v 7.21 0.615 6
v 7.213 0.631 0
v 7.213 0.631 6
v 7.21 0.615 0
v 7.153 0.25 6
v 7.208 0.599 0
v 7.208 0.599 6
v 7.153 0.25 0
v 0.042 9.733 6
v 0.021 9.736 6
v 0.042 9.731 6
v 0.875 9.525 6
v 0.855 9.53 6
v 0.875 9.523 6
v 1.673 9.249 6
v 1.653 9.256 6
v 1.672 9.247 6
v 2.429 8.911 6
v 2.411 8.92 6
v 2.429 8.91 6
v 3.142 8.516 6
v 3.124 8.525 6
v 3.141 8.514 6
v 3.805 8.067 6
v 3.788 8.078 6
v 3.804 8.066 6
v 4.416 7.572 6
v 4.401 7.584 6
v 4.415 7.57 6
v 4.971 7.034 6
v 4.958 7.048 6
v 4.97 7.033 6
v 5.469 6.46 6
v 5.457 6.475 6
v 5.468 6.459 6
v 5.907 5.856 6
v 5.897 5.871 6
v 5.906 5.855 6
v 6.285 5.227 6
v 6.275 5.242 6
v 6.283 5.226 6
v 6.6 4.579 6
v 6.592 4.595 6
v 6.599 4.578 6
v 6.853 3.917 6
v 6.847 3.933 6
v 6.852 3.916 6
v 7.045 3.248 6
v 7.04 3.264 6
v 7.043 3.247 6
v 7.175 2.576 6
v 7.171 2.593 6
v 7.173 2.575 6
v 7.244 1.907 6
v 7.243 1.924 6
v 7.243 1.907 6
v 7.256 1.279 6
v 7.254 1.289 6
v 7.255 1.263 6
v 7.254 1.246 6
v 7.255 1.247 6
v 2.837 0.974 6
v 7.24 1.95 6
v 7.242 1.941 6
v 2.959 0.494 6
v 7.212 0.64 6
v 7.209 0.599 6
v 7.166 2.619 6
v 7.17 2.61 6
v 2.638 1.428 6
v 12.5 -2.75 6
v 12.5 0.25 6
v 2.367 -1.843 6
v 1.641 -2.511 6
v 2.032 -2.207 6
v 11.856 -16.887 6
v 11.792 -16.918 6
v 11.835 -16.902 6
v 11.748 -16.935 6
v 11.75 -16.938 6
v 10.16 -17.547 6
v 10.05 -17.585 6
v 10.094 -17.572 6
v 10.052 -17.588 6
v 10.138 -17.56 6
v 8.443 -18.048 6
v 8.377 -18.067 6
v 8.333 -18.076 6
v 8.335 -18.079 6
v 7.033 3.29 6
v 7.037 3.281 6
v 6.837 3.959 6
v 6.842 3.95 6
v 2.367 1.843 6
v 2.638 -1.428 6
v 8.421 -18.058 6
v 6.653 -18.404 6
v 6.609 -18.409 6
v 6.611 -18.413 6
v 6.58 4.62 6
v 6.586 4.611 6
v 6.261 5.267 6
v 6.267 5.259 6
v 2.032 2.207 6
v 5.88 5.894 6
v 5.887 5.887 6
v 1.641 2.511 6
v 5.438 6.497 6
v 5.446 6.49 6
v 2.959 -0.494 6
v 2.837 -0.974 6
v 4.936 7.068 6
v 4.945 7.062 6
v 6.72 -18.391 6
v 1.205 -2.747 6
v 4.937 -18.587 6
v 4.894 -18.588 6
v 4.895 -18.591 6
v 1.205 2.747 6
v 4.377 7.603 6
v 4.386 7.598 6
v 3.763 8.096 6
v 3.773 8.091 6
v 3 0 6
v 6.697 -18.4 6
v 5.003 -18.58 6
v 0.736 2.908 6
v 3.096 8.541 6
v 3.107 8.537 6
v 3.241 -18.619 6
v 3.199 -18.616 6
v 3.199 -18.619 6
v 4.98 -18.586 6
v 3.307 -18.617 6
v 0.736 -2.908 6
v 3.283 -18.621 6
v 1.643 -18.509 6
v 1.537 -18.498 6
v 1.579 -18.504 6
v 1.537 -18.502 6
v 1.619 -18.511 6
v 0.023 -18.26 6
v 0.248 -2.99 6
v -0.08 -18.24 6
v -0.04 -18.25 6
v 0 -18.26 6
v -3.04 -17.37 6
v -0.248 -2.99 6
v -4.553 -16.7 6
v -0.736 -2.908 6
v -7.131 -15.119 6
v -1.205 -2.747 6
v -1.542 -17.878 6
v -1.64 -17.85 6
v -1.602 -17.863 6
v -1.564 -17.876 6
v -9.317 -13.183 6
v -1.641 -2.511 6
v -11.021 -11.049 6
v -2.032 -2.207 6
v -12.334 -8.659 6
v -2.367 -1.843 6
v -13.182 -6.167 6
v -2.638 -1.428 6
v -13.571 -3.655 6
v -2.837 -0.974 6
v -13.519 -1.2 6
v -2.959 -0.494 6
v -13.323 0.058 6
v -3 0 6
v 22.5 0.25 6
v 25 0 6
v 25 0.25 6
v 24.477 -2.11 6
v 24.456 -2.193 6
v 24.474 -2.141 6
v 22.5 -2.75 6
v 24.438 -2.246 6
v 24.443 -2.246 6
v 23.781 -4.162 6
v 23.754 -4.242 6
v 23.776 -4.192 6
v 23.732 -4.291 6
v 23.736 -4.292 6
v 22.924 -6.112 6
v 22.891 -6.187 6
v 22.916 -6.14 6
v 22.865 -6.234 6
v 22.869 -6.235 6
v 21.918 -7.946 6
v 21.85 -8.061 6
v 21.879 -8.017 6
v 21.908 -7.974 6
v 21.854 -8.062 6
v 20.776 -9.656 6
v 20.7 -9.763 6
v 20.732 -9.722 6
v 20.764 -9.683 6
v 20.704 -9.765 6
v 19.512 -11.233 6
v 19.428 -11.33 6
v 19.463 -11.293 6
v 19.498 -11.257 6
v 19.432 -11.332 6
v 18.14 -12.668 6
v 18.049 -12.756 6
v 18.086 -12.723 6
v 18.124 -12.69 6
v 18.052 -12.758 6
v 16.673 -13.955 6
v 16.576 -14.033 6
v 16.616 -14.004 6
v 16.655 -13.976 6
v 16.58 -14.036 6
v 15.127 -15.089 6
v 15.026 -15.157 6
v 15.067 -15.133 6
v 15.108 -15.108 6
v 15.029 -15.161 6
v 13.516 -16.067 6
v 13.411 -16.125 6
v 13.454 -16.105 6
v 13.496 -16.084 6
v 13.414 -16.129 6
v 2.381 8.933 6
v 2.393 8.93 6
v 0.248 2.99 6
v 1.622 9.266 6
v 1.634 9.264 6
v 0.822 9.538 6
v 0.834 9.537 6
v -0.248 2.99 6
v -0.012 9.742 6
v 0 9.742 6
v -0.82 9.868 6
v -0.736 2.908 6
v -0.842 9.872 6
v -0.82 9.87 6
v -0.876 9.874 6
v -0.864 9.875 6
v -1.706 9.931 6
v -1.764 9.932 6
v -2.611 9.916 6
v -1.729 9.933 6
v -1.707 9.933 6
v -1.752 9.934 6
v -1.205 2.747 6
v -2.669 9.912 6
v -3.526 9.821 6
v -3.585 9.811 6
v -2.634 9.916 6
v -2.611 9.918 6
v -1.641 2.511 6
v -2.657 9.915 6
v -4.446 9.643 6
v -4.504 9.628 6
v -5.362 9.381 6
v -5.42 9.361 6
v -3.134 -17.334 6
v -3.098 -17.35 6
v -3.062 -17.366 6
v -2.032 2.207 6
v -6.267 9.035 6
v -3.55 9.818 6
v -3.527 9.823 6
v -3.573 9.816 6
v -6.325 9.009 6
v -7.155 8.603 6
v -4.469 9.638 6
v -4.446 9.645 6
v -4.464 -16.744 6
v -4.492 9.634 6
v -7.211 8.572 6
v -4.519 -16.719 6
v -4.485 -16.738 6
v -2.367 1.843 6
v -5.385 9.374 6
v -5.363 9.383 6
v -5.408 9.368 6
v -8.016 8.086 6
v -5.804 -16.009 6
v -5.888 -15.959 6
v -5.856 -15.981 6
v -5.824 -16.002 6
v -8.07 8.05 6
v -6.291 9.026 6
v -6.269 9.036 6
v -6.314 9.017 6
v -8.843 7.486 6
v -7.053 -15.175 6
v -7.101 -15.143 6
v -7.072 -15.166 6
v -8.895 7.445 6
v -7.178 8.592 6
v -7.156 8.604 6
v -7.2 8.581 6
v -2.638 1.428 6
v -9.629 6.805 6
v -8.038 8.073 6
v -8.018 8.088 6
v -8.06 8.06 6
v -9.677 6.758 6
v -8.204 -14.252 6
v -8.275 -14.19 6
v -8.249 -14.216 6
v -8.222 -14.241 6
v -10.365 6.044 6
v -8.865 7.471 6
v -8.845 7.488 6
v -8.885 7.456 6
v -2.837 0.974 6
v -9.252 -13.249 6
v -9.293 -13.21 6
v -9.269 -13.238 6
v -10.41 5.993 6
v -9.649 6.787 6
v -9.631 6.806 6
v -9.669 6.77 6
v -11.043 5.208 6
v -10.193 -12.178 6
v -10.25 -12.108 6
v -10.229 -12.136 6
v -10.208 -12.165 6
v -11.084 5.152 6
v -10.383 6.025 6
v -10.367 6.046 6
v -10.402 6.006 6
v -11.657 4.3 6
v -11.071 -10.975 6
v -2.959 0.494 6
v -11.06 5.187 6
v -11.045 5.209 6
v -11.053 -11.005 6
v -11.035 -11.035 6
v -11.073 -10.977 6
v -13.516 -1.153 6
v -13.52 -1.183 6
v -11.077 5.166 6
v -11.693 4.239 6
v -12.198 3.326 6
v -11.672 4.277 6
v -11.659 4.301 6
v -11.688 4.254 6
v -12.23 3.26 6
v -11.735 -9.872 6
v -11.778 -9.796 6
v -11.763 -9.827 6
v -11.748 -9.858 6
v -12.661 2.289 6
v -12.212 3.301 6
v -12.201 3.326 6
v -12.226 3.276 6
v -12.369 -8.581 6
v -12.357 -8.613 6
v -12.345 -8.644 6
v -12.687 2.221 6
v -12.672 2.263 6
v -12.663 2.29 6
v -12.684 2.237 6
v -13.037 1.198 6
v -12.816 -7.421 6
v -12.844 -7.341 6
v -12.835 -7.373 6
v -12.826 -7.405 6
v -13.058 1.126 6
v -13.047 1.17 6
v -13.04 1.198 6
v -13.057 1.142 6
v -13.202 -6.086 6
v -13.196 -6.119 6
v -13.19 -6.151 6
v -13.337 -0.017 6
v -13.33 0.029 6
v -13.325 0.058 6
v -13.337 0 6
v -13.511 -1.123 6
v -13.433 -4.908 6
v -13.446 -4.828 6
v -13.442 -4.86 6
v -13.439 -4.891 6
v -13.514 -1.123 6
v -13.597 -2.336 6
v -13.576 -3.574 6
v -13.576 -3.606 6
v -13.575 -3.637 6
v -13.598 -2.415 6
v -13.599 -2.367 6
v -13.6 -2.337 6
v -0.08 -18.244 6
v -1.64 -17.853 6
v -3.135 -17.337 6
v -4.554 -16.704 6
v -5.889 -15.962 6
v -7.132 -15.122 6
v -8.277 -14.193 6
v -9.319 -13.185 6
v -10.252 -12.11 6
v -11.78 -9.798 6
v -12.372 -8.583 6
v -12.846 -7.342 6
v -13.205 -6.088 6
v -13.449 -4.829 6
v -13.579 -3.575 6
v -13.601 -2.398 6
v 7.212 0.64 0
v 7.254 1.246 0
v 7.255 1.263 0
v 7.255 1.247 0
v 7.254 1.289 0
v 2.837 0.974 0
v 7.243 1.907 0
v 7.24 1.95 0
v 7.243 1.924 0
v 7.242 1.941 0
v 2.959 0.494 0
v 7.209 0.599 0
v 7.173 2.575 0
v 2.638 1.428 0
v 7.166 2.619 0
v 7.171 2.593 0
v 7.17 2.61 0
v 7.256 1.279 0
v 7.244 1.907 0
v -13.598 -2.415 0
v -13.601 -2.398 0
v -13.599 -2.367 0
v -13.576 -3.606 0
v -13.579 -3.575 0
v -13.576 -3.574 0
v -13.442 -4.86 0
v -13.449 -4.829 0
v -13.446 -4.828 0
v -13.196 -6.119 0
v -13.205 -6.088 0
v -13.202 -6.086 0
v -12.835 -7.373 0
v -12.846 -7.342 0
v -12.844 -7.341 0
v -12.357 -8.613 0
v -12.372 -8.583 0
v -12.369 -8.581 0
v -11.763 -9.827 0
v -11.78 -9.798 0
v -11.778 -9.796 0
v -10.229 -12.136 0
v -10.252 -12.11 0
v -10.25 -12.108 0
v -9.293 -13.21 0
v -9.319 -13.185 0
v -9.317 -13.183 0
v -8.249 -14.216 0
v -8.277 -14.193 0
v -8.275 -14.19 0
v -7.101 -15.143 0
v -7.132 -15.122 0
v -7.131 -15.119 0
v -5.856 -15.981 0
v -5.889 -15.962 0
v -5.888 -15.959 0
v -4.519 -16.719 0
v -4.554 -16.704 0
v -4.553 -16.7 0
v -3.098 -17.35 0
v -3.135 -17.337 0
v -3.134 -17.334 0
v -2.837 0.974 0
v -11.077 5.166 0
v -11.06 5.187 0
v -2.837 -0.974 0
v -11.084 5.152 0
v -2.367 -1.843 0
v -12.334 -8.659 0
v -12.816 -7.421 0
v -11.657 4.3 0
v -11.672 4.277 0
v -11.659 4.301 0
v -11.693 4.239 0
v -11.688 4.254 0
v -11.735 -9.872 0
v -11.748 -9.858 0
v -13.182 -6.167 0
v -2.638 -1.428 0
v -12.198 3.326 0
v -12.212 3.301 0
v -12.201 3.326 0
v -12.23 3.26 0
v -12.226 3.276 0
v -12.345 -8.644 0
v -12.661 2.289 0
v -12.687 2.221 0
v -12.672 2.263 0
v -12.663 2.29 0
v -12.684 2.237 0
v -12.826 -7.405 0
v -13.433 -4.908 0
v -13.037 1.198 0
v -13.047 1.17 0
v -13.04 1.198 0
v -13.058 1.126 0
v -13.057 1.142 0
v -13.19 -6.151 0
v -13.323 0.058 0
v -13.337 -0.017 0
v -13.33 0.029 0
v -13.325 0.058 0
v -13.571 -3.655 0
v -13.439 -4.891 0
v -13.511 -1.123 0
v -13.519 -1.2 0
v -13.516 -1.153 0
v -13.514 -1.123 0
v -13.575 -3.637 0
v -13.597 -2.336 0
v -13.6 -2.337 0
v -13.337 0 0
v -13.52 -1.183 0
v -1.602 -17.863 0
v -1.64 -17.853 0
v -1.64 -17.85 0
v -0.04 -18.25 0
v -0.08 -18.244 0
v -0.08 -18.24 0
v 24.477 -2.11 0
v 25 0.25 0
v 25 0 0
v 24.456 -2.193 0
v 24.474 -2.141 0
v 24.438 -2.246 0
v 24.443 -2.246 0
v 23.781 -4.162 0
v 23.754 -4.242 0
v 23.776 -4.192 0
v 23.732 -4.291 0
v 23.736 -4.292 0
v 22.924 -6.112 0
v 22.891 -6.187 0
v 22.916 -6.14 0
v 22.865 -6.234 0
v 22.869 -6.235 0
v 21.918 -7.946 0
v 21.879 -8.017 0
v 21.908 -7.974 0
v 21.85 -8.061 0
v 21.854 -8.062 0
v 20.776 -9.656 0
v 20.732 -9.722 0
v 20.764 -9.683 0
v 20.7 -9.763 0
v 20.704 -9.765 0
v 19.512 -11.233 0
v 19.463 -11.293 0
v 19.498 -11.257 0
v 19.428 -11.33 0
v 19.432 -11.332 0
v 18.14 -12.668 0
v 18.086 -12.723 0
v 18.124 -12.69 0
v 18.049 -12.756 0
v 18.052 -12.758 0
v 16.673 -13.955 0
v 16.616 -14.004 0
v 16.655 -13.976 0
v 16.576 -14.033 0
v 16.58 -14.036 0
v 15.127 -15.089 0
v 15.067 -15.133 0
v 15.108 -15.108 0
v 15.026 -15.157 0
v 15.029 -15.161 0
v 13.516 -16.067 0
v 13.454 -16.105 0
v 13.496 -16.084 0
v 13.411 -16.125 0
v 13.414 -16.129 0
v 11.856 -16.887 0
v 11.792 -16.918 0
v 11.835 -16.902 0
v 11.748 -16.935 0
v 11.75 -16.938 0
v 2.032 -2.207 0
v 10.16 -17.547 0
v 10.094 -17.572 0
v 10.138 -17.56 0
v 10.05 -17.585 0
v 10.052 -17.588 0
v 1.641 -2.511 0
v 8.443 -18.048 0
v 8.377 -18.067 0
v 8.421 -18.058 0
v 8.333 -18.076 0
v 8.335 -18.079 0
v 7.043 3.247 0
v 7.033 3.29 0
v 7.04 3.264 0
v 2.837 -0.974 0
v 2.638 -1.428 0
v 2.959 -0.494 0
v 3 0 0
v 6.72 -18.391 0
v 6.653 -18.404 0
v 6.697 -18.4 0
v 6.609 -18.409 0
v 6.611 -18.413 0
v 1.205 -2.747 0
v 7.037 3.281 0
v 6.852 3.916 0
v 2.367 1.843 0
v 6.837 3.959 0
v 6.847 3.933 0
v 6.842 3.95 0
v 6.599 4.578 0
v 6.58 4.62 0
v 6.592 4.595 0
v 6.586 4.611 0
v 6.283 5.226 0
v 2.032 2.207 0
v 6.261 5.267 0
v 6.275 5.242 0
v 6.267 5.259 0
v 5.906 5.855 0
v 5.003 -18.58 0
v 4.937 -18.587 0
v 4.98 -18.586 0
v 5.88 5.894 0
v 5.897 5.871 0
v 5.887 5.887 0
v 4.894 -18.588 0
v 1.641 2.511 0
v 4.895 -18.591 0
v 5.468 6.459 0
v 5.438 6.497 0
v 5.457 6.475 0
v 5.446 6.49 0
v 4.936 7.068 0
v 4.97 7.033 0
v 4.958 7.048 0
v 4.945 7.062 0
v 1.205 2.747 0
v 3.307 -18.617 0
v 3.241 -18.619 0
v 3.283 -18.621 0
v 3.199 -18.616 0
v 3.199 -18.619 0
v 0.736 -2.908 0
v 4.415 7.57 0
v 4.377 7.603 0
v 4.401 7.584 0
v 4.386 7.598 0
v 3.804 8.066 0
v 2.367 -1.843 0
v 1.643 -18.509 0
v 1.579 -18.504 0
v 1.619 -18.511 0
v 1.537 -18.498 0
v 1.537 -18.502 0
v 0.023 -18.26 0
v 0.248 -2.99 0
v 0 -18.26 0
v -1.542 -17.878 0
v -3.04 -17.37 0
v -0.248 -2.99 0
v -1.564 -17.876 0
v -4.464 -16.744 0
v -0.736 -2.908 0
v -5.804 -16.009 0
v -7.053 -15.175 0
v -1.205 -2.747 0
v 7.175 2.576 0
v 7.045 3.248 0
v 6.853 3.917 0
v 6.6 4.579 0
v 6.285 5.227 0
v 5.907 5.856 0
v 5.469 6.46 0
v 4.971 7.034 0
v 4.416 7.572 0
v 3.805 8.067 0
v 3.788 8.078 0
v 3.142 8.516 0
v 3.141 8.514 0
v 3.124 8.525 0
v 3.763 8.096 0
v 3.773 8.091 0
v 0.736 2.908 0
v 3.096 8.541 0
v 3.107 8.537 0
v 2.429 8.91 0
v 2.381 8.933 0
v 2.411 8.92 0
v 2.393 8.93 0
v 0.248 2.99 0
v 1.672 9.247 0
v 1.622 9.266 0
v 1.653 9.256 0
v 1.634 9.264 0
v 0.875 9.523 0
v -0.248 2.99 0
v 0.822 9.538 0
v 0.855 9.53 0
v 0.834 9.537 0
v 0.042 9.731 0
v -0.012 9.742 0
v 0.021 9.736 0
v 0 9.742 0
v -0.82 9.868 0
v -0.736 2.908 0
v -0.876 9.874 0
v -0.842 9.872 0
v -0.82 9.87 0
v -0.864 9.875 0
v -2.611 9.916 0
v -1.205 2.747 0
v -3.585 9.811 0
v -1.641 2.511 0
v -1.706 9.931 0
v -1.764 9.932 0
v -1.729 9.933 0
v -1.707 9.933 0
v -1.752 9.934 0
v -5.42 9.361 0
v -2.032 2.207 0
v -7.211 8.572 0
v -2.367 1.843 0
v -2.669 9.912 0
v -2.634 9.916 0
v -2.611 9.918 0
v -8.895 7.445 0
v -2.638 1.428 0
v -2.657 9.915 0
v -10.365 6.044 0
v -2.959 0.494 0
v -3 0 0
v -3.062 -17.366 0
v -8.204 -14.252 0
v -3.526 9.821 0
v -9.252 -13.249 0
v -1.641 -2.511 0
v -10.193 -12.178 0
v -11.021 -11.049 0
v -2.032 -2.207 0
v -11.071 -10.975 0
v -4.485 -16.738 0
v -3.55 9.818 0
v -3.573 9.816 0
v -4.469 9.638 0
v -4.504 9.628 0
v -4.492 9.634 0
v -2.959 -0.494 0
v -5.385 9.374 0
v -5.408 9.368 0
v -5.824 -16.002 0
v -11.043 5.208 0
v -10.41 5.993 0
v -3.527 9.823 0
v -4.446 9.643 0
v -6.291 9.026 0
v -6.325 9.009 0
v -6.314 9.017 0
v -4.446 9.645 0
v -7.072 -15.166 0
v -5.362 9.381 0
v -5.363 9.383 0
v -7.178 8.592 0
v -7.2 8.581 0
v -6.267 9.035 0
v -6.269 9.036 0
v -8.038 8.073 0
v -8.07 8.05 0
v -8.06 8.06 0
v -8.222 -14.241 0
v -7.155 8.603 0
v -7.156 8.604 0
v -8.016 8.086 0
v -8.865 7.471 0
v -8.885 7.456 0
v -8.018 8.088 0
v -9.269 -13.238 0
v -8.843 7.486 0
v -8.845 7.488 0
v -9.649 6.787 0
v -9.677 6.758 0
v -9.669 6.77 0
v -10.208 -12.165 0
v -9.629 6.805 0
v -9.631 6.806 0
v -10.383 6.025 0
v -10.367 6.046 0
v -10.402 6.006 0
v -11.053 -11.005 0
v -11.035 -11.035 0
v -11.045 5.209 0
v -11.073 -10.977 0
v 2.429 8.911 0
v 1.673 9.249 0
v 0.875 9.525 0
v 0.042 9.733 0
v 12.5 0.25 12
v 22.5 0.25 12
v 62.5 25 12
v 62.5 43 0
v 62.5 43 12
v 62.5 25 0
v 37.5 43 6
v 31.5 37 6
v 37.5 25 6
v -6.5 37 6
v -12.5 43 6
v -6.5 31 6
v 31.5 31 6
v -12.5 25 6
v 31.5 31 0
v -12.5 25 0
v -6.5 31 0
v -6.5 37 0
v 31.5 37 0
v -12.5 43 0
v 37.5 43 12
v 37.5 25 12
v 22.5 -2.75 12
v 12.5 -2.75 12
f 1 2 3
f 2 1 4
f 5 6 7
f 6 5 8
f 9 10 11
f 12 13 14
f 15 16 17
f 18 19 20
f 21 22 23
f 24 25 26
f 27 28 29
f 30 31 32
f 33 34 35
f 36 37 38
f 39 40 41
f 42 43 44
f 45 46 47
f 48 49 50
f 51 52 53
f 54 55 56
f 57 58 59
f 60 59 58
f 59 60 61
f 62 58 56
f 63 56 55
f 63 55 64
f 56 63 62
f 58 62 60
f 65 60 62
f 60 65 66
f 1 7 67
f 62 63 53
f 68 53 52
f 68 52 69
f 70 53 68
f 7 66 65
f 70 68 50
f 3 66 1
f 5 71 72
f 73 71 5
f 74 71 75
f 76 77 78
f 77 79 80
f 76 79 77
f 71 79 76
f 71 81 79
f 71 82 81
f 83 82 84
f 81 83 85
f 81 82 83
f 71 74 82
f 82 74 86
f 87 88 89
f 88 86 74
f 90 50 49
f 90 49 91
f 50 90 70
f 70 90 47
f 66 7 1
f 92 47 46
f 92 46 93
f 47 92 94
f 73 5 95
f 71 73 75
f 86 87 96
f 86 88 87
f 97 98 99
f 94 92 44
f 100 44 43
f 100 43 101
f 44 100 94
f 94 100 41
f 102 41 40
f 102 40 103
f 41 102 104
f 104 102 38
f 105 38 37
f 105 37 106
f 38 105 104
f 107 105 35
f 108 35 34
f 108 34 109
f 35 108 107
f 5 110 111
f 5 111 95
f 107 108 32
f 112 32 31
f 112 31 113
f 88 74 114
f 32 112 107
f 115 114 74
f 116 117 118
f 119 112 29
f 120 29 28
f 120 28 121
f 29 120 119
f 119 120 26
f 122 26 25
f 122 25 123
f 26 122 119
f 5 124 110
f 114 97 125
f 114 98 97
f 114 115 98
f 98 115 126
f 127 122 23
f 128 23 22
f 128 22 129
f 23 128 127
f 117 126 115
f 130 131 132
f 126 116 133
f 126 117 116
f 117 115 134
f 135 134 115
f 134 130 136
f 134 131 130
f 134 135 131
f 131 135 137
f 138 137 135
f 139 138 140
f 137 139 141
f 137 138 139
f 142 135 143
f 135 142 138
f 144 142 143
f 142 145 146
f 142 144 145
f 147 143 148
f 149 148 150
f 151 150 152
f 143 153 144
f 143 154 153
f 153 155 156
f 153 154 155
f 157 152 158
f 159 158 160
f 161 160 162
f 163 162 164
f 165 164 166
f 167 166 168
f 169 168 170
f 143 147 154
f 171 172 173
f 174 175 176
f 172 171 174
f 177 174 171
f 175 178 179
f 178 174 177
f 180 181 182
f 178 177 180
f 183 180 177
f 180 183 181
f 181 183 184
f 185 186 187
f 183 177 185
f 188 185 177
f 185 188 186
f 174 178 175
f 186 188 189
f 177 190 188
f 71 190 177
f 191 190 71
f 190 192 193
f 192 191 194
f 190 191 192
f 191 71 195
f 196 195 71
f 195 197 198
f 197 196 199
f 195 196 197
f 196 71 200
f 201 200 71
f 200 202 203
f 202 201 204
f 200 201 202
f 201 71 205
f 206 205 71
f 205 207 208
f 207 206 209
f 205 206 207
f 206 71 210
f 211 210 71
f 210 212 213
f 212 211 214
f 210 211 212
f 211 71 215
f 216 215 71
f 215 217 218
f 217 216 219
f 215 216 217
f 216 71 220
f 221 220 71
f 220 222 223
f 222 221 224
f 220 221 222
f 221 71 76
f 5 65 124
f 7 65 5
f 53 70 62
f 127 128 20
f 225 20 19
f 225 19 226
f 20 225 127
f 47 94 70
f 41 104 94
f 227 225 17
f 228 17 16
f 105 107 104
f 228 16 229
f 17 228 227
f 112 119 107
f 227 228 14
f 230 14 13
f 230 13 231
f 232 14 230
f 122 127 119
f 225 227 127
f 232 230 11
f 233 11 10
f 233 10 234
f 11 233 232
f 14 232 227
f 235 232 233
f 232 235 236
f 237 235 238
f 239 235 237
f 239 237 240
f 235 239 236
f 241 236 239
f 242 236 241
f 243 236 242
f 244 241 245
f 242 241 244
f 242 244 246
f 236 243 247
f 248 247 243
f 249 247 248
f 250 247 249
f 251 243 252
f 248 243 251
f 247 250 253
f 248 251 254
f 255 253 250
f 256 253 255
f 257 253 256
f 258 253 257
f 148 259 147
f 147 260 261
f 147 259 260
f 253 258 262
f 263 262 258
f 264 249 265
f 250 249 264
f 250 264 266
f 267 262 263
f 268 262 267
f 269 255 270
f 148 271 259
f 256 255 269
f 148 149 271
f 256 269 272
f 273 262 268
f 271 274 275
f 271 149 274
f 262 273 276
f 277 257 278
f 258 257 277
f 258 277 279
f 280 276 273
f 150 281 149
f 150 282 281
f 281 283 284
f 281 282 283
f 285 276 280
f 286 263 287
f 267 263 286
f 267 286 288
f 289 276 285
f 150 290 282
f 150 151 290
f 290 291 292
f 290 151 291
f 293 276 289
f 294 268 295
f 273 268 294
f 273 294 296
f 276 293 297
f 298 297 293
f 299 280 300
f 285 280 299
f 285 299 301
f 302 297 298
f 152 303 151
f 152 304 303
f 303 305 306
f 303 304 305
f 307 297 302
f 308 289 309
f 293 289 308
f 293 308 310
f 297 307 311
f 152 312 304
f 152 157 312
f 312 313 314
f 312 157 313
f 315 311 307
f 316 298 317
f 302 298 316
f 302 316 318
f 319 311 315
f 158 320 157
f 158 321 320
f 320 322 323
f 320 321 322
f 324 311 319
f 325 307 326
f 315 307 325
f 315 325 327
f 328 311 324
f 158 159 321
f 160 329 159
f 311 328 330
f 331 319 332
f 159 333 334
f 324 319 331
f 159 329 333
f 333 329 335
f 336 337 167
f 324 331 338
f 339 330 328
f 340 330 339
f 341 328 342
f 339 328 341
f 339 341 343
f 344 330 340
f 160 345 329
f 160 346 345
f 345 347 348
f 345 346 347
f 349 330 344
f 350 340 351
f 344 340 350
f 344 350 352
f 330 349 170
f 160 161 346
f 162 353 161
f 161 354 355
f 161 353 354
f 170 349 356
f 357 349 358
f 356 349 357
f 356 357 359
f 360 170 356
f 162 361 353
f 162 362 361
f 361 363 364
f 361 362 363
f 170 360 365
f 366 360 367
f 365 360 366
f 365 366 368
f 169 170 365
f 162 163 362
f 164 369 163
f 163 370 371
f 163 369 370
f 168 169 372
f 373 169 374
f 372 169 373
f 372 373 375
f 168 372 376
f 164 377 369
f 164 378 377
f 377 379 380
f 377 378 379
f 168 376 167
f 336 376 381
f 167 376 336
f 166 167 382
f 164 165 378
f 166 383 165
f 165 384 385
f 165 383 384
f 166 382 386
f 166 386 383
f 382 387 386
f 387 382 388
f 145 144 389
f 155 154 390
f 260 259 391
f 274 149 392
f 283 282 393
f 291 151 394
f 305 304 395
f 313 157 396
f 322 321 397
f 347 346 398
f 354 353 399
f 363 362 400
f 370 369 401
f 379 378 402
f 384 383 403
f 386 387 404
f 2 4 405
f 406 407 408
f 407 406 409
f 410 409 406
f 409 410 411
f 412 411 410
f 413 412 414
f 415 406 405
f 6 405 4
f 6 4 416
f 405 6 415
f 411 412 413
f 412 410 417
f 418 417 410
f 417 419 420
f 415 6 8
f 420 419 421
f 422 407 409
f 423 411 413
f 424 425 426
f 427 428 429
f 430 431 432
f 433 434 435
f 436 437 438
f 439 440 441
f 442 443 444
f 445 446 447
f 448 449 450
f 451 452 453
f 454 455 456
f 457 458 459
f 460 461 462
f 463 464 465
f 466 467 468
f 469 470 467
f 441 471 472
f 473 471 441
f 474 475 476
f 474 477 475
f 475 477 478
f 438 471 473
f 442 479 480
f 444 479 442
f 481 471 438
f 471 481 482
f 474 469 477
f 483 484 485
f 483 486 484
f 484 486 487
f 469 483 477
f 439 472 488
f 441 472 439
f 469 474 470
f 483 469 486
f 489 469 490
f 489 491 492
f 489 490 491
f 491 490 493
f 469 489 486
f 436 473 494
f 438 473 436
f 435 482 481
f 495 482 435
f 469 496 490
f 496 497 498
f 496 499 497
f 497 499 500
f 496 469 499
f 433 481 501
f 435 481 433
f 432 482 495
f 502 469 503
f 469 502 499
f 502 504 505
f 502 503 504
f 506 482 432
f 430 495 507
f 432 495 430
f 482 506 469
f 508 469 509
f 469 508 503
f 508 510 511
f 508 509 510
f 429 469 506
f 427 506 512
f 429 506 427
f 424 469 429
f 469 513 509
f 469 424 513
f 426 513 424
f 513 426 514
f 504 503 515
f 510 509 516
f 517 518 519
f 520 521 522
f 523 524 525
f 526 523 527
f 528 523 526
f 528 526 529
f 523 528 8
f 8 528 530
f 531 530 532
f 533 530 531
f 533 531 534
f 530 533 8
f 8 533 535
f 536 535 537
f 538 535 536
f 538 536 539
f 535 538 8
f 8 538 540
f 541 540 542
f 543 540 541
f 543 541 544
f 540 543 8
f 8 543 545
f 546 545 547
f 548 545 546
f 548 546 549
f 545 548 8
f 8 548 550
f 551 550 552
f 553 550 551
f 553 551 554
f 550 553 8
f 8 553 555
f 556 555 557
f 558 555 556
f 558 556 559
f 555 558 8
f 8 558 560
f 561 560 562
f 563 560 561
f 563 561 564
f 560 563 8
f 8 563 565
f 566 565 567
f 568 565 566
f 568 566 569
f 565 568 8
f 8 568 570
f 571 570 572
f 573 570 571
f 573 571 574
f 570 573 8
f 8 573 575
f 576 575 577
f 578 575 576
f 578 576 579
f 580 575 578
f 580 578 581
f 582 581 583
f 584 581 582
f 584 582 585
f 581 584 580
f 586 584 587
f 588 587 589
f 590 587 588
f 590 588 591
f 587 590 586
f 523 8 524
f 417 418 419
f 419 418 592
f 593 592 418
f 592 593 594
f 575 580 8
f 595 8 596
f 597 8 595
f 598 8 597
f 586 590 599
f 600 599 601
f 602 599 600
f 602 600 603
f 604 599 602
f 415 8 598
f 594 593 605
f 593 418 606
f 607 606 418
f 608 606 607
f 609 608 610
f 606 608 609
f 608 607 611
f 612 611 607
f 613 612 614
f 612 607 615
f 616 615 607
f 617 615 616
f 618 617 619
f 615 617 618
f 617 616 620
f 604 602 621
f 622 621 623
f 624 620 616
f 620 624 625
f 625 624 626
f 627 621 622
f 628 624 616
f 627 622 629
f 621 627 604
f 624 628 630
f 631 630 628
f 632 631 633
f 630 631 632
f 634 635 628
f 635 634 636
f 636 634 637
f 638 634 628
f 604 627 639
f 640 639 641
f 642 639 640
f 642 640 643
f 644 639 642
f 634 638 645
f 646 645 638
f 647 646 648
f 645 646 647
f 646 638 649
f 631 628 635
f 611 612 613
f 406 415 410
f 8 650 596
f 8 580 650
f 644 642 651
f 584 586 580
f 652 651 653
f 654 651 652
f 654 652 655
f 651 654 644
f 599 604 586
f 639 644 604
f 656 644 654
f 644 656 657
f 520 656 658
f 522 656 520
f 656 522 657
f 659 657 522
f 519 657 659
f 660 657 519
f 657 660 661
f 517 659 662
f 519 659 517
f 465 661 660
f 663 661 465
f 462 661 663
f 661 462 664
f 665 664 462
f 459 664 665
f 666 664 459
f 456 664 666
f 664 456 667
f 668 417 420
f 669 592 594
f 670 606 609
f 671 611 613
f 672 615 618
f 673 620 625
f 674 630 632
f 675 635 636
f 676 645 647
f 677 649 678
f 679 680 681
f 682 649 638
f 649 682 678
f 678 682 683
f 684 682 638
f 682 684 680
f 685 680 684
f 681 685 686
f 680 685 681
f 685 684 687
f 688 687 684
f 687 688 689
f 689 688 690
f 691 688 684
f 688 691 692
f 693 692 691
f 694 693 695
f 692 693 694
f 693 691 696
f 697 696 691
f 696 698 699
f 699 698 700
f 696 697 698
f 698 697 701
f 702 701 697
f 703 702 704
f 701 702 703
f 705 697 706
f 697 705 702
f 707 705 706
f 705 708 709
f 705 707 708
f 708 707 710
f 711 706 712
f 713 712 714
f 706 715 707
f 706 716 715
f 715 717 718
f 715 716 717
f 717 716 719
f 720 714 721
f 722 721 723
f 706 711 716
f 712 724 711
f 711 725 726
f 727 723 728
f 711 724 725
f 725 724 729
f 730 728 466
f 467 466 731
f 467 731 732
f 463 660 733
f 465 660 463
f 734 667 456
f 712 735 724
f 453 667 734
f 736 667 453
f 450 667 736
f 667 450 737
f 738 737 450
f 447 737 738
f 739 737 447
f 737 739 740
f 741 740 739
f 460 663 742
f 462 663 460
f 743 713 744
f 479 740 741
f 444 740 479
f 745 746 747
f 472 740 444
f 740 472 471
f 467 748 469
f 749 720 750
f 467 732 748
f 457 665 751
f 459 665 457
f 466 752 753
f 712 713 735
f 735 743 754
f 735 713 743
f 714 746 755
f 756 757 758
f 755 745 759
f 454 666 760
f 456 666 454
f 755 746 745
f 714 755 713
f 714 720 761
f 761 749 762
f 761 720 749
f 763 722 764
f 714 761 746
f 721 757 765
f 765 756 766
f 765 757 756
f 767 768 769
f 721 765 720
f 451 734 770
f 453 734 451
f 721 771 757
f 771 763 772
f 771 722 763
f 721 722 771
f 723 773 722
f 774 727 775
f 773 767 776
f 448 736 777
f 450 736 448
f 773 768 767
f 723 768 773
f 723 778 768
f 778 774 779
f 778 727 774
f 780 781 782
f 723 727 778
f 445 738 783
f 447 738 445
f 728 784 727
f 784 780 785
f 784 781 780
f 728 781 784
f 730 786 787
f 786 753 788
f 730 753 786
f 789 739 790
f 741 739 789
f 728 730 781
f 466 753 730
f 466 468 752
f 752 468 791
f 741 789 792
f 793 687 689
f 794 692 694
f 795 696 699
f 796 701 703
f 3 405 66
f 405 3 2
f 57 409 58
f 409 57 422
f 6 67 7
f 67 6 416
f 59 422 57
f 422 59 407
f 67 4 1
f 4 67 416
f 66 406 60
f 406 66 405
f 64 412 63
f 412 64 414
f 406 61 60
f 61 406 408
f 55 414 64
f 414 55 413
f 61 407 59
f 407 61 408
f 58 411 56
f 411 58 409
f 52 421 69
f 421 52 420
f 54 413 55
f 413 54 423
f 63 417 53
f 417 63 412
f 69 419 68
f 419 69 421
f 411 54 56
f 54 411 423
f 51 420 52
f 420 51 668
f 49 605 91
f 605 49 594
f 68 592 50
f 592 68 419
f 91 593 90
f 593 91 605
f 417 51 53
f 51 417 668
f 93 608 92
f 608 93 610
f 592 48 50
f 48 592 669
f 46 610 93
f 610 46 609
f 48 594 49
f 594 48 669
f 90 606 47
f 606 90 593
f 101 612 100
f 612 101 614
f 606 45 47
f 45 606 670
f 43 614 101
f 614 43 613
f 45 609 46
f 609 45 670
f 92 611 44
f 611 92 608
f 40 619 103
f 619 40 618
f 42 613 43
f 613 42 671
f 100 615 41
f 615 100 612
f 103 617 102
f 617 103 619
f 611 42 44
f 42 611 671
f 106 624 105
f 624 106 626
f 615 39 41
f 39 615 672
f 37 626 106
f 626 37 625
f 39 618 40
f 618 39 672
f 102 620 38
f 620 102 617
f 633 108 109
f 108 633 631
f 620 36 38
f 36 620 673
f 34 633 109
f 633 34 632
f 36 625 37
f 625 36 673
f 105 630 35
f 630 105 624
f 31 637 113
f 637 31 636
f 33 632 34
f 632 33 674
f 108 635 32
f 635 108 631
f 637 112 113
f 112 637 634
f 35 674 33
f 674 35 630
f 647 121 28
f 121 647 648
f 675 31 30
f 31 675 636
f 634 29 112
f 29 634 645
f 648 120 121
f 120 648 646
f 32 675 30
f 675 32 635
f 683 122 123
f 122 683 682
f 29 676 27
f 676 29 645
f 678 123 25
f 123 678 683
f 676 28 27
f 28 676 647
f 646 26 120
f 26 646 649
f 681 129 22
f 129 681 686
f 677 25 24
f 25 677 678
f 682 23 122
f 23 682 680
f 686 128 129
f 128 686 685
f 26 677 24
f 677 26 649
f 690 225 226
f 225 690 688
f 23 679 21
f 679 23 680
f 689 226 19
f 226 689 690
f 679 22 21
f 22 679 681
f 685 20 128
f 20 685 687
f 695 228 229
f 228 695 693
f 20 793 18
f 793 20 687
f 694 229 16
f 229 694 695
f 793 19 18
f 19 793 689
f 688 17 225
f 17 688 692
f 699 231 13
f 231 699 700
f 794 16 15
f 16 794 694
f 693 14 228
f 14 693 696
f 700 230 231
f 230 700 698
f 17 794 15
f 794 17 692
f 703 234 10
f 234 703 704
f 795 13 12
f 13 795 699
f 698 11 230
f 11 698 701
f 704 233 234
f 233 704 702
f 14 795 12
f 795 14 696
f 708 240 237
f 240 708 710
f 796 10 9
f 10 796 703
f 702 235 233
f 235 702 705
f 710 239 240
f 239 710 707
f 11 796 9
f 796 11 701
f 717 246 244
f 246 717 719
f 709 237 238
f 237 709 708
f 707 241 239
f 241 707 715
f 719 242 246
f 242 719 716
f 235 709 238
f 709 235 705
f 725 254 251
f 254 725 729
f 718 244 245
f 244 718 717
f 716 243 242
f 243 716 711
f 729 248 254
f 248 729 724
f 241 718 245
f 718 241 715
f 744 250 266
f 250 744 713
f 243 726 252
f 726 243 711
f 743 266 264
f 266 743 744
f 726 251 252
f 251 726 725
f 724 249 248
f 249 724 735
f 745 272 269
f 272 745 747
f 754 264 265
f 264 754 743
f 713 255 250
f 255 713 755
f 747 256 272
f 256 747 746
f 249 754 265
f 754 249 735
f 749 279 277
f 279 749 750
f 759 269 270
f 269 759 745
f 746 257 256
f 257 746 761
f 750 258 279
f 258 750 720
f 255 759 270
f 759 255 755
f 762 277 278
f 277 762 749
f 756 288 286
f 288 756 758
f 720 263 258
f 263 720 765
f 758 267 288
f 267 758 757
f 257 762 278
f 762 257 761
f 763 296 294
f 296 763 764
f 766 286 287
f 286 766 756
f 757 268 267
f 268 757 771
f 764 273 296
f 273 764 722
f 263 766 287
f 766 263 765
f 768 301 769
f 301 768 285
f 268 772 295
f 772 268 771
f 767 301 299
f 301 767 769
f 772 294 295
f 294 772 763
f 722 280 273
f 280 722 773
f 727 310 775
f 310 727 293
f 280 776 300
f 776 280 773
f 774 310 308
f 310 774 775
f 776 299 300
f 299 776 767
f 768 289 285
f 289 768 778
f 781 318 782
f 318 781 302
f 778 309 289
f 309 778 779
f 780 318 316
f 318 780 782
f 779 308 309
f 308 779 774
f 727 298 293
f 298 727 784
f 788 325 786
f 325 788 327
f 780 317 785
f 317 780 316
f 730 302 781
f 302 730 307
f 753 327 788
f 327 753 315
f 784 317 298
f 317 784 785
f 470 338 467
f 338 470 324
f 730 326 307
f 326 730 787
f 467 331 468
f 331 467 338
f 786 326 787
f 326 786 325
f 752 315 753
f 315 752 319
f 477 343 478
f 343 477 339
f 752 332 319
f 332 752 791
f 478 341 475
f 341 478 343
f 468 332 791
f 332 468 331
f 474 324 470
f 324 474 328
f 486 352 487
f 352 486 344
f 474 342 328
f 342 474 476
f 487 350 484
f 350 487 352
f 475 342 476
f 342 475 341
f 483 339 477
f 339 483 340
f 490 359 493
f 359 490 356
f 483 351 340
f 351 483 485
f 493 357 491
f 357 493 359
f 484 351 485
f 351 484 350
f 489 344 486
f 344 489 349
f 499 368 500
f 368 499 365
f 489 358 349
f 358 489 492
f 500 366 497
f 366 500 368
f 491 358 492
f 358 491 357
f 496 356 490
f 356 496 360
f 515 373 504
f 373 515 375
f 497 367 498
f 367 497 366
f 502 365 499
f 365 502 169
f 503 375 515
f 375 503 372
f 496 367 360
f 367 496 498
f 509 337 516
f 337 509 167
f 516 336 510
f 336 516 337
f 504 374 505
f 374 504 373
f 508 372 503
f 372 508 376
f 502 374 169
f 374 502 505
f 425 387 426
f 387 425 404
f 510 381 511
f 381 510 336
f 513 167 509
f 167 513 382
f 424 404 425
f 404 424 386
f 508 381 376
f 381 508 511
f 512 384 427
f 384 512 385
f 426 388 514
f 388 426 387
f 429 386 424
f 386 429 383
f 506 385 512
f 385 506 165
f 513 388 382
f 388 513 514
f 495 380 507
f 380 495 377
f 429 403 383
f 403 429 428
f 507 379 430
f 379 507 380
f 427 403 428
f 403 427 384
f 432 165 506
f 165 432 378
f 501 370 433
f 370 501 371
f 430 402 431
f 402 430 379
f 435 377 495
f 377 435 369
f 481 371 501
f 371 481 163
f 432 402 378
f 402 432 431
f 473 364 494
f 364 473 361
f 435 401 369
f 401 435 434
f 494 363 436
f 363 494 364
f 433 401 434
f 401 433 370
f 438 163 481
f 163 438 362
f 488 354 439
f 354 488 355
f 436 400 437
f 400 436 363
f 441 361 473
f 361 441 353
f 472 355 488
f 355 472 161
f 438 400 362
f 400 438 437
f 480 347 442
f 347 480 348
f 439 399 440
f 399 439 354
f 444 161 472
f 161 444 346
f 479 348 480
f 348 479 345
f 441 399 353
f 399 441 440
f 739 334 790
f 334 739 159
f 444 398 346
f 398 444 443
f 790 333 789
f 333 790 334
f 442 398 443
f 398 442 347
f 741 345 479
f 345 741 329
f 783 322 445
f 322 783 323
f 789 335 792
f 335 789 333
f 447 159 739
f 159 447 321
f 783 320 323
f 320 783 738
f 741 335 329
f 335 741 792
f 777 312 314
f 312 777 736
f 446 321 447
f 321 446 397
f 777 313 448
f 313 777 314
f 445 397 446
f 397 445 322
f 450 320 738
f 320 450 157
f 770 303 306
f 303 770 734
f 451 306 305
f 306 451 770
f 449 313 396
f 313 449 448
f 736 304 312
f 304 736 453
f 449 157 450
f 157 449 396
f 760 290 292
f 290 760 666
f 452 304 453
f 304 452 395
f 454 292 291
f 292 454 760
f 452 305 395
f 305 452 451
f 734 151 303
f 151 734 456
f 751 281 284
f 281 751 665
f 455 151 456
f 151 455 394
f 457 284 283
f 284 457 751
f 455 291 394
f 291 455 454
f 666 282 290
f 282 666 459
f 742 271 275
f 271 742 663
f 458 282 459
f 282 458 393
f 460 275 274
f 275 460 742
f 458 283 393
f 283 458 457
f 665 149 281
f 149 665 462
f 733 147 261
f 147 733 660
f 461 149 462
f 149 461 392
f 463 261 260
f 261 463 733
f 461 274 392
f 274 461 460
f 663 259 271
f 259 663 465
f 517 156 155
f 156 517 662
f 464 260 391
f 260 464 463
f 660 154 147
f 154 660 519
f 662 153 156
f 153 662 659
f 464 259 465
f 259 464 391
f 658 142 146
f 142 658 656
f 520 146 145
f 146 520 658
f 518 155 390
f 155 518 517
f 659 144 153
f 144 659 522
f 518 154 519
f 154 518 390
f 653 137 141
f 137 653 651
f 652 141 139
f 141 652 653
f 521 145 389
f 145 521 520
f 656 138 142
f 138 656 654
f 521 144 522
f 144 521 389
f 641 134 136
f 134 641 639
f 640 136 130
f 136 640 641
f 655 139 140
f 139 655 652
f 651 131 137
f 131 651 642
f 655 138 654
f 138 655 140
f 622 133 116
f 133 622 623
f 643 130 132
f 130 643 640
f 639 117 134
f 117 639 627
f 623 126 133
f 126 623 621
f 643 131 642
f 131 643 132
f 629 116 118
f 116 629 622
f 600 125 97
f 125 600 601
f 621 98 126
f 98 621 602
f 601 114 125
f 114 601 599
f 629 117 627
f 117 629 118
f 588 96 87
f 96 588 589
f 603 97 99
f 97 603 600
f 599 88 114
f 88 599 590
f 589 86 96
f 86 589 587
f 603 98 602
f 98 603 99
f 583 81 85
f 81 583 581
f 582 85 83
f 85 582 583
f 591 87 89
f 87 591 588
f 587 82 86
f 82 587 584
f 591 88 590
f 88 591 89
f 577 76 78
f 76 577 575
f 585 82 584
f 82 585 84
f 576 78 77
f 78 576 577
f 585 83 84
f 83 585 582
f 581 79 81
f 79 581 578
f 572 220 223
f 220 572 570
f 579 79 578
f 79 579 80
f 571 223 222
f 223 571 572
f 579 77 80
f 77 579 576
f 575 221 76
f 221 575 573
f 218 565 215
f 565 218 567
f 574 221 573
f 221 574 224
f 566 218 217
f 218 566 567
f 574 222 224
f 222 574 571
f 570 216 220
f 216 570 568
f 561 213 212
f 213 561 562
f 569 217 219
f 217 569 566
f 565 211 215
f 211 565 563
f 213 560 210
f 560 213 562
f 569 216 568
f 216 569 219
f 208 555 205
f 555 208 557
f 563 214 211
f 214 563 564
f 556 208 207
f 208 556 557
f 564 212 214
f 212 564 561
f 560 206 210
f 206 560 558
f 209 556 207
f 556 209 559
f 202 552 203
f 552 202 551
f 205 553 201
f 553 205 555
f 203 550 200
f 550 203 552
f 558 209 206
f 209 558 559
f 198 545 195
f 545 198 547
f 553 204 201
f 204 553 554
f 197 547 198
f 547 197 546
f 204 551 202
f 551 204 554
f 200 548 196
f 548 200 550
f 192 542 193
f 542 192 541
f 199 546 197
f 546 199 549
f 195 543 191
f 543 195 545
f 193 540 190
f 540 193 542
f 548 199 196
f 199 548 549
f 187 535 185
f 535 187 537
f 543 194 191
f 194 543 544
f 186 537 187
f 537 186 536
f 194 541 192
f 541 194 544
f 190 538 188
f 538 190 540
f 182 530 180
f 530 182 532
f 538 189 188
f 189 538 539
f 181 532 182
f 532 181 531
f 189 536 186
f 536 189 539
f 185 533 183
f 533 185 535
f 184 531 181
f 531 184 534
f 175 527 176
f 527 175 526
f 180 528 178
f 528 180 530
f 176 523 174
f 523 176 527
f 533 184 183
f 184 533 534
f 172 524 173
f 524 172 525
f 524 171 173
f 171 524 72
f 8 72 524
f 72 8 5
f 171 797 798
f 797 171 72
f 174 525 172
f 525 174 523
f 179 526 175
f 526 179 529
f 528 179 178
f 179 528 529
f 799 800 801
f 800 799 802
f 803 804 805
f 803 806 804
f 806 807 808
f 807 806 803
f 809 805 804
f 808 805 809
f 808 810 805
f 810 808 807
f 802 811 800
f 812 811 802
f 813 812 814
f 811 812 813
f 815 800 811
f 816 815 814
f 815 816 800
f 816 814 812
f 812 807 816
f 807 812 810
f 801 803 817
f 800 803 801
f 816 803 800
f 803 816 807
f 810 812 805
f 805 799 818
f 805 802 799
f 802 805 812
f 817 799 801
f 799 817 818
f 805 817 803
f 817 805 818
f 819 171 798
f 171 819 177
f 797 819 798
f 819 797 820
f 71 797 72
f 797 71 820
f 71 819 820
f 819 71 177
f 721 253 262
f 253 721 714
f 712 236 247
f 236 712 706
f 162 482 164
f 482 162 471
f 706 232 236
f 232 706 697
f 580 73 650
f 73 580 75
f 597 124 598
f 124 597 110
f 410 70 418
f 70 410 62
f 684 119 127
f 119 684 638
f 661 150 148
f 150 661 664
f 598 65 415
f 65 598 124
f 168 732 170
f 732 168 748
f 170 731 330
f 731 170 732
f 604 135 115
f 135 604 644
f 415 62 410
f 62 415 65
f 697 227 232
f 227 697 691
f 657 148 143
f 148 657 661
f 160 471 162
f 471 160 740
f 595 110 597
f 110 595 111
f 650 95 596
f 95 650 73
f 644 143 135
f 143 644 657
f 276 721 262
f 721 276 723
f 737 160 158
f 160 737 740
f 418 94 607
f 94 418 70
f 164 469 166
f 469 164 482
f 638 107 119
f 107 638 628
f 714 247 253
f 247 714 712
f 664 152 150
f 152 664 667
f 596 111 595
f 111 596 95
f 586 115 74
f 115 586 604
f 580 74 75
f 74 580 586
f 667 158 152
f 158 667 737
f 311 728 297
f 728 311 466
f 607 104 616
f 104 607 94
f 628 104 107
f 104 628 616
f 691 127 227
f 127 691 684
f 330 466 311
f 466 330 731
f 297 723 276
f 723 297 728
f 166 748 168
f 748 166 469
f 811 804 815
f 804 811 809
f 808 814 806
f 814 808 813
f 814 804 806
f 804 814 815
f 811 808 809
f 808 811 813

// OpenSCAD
// model variables
$fa=0.5*1; // default minimum facet angle is now 0.5 deg
$fs=0.5*1; // default minimum facet size is now 0.5 mm
tolx=0.25; // tolerance for mating parts.

    // Maximum diameter
    max_dia = 25; // [15:50]
    // Thickness of slab
    thickness = 6; // [1:25]
    // Central Bore diameter
    bore = 6; // [3:24]
    // Spiral: higher values are more circular
    spiral=5; // [3:30]
    // coarseness: higher values take longer to render
    dt=5; // [1:20]

    b=(1/spiral)*(2*PI)/360;
    a=1/exp(b*360);

module positive_elements(){
    for (t=[dt:dt:360]){
        r_minus=a*exp(b*(t-(dt+tolx)));
        r_plus=a*exp(b*t);
        hull(){
            rotate([0,0,t-(dt+tolx)]) cube([r_minus*max_dia,tolx,thickness]);
            rotate([0,0,t]) cube([r_plus*max_dia,tolx,thickness]);
        }
    }
    translate([max_dia-12.5,-3+tolx,0]) cube([10,3,thickness*2]);

    translate([-max_dia/2,max_dia,0]){
        cube([max_dia*3,bore*3,thickness]);
        translate([max_dia*2,0,thickness]) cube([max_dia,bore*3,thickness]);
        }
}


module negative_elements(){
    translate([0,0,-tolx]) cylinder(r=bore/2,h=thickness+2*tolx);

    translate([-max_dia/2+bore,max_dia+bore,-tolx]){
        cube([max_dia*2-2*bore,bore,thickness+2*tolx]);}
}

difference(){
    positive_elements();
    negative_elements();
}
